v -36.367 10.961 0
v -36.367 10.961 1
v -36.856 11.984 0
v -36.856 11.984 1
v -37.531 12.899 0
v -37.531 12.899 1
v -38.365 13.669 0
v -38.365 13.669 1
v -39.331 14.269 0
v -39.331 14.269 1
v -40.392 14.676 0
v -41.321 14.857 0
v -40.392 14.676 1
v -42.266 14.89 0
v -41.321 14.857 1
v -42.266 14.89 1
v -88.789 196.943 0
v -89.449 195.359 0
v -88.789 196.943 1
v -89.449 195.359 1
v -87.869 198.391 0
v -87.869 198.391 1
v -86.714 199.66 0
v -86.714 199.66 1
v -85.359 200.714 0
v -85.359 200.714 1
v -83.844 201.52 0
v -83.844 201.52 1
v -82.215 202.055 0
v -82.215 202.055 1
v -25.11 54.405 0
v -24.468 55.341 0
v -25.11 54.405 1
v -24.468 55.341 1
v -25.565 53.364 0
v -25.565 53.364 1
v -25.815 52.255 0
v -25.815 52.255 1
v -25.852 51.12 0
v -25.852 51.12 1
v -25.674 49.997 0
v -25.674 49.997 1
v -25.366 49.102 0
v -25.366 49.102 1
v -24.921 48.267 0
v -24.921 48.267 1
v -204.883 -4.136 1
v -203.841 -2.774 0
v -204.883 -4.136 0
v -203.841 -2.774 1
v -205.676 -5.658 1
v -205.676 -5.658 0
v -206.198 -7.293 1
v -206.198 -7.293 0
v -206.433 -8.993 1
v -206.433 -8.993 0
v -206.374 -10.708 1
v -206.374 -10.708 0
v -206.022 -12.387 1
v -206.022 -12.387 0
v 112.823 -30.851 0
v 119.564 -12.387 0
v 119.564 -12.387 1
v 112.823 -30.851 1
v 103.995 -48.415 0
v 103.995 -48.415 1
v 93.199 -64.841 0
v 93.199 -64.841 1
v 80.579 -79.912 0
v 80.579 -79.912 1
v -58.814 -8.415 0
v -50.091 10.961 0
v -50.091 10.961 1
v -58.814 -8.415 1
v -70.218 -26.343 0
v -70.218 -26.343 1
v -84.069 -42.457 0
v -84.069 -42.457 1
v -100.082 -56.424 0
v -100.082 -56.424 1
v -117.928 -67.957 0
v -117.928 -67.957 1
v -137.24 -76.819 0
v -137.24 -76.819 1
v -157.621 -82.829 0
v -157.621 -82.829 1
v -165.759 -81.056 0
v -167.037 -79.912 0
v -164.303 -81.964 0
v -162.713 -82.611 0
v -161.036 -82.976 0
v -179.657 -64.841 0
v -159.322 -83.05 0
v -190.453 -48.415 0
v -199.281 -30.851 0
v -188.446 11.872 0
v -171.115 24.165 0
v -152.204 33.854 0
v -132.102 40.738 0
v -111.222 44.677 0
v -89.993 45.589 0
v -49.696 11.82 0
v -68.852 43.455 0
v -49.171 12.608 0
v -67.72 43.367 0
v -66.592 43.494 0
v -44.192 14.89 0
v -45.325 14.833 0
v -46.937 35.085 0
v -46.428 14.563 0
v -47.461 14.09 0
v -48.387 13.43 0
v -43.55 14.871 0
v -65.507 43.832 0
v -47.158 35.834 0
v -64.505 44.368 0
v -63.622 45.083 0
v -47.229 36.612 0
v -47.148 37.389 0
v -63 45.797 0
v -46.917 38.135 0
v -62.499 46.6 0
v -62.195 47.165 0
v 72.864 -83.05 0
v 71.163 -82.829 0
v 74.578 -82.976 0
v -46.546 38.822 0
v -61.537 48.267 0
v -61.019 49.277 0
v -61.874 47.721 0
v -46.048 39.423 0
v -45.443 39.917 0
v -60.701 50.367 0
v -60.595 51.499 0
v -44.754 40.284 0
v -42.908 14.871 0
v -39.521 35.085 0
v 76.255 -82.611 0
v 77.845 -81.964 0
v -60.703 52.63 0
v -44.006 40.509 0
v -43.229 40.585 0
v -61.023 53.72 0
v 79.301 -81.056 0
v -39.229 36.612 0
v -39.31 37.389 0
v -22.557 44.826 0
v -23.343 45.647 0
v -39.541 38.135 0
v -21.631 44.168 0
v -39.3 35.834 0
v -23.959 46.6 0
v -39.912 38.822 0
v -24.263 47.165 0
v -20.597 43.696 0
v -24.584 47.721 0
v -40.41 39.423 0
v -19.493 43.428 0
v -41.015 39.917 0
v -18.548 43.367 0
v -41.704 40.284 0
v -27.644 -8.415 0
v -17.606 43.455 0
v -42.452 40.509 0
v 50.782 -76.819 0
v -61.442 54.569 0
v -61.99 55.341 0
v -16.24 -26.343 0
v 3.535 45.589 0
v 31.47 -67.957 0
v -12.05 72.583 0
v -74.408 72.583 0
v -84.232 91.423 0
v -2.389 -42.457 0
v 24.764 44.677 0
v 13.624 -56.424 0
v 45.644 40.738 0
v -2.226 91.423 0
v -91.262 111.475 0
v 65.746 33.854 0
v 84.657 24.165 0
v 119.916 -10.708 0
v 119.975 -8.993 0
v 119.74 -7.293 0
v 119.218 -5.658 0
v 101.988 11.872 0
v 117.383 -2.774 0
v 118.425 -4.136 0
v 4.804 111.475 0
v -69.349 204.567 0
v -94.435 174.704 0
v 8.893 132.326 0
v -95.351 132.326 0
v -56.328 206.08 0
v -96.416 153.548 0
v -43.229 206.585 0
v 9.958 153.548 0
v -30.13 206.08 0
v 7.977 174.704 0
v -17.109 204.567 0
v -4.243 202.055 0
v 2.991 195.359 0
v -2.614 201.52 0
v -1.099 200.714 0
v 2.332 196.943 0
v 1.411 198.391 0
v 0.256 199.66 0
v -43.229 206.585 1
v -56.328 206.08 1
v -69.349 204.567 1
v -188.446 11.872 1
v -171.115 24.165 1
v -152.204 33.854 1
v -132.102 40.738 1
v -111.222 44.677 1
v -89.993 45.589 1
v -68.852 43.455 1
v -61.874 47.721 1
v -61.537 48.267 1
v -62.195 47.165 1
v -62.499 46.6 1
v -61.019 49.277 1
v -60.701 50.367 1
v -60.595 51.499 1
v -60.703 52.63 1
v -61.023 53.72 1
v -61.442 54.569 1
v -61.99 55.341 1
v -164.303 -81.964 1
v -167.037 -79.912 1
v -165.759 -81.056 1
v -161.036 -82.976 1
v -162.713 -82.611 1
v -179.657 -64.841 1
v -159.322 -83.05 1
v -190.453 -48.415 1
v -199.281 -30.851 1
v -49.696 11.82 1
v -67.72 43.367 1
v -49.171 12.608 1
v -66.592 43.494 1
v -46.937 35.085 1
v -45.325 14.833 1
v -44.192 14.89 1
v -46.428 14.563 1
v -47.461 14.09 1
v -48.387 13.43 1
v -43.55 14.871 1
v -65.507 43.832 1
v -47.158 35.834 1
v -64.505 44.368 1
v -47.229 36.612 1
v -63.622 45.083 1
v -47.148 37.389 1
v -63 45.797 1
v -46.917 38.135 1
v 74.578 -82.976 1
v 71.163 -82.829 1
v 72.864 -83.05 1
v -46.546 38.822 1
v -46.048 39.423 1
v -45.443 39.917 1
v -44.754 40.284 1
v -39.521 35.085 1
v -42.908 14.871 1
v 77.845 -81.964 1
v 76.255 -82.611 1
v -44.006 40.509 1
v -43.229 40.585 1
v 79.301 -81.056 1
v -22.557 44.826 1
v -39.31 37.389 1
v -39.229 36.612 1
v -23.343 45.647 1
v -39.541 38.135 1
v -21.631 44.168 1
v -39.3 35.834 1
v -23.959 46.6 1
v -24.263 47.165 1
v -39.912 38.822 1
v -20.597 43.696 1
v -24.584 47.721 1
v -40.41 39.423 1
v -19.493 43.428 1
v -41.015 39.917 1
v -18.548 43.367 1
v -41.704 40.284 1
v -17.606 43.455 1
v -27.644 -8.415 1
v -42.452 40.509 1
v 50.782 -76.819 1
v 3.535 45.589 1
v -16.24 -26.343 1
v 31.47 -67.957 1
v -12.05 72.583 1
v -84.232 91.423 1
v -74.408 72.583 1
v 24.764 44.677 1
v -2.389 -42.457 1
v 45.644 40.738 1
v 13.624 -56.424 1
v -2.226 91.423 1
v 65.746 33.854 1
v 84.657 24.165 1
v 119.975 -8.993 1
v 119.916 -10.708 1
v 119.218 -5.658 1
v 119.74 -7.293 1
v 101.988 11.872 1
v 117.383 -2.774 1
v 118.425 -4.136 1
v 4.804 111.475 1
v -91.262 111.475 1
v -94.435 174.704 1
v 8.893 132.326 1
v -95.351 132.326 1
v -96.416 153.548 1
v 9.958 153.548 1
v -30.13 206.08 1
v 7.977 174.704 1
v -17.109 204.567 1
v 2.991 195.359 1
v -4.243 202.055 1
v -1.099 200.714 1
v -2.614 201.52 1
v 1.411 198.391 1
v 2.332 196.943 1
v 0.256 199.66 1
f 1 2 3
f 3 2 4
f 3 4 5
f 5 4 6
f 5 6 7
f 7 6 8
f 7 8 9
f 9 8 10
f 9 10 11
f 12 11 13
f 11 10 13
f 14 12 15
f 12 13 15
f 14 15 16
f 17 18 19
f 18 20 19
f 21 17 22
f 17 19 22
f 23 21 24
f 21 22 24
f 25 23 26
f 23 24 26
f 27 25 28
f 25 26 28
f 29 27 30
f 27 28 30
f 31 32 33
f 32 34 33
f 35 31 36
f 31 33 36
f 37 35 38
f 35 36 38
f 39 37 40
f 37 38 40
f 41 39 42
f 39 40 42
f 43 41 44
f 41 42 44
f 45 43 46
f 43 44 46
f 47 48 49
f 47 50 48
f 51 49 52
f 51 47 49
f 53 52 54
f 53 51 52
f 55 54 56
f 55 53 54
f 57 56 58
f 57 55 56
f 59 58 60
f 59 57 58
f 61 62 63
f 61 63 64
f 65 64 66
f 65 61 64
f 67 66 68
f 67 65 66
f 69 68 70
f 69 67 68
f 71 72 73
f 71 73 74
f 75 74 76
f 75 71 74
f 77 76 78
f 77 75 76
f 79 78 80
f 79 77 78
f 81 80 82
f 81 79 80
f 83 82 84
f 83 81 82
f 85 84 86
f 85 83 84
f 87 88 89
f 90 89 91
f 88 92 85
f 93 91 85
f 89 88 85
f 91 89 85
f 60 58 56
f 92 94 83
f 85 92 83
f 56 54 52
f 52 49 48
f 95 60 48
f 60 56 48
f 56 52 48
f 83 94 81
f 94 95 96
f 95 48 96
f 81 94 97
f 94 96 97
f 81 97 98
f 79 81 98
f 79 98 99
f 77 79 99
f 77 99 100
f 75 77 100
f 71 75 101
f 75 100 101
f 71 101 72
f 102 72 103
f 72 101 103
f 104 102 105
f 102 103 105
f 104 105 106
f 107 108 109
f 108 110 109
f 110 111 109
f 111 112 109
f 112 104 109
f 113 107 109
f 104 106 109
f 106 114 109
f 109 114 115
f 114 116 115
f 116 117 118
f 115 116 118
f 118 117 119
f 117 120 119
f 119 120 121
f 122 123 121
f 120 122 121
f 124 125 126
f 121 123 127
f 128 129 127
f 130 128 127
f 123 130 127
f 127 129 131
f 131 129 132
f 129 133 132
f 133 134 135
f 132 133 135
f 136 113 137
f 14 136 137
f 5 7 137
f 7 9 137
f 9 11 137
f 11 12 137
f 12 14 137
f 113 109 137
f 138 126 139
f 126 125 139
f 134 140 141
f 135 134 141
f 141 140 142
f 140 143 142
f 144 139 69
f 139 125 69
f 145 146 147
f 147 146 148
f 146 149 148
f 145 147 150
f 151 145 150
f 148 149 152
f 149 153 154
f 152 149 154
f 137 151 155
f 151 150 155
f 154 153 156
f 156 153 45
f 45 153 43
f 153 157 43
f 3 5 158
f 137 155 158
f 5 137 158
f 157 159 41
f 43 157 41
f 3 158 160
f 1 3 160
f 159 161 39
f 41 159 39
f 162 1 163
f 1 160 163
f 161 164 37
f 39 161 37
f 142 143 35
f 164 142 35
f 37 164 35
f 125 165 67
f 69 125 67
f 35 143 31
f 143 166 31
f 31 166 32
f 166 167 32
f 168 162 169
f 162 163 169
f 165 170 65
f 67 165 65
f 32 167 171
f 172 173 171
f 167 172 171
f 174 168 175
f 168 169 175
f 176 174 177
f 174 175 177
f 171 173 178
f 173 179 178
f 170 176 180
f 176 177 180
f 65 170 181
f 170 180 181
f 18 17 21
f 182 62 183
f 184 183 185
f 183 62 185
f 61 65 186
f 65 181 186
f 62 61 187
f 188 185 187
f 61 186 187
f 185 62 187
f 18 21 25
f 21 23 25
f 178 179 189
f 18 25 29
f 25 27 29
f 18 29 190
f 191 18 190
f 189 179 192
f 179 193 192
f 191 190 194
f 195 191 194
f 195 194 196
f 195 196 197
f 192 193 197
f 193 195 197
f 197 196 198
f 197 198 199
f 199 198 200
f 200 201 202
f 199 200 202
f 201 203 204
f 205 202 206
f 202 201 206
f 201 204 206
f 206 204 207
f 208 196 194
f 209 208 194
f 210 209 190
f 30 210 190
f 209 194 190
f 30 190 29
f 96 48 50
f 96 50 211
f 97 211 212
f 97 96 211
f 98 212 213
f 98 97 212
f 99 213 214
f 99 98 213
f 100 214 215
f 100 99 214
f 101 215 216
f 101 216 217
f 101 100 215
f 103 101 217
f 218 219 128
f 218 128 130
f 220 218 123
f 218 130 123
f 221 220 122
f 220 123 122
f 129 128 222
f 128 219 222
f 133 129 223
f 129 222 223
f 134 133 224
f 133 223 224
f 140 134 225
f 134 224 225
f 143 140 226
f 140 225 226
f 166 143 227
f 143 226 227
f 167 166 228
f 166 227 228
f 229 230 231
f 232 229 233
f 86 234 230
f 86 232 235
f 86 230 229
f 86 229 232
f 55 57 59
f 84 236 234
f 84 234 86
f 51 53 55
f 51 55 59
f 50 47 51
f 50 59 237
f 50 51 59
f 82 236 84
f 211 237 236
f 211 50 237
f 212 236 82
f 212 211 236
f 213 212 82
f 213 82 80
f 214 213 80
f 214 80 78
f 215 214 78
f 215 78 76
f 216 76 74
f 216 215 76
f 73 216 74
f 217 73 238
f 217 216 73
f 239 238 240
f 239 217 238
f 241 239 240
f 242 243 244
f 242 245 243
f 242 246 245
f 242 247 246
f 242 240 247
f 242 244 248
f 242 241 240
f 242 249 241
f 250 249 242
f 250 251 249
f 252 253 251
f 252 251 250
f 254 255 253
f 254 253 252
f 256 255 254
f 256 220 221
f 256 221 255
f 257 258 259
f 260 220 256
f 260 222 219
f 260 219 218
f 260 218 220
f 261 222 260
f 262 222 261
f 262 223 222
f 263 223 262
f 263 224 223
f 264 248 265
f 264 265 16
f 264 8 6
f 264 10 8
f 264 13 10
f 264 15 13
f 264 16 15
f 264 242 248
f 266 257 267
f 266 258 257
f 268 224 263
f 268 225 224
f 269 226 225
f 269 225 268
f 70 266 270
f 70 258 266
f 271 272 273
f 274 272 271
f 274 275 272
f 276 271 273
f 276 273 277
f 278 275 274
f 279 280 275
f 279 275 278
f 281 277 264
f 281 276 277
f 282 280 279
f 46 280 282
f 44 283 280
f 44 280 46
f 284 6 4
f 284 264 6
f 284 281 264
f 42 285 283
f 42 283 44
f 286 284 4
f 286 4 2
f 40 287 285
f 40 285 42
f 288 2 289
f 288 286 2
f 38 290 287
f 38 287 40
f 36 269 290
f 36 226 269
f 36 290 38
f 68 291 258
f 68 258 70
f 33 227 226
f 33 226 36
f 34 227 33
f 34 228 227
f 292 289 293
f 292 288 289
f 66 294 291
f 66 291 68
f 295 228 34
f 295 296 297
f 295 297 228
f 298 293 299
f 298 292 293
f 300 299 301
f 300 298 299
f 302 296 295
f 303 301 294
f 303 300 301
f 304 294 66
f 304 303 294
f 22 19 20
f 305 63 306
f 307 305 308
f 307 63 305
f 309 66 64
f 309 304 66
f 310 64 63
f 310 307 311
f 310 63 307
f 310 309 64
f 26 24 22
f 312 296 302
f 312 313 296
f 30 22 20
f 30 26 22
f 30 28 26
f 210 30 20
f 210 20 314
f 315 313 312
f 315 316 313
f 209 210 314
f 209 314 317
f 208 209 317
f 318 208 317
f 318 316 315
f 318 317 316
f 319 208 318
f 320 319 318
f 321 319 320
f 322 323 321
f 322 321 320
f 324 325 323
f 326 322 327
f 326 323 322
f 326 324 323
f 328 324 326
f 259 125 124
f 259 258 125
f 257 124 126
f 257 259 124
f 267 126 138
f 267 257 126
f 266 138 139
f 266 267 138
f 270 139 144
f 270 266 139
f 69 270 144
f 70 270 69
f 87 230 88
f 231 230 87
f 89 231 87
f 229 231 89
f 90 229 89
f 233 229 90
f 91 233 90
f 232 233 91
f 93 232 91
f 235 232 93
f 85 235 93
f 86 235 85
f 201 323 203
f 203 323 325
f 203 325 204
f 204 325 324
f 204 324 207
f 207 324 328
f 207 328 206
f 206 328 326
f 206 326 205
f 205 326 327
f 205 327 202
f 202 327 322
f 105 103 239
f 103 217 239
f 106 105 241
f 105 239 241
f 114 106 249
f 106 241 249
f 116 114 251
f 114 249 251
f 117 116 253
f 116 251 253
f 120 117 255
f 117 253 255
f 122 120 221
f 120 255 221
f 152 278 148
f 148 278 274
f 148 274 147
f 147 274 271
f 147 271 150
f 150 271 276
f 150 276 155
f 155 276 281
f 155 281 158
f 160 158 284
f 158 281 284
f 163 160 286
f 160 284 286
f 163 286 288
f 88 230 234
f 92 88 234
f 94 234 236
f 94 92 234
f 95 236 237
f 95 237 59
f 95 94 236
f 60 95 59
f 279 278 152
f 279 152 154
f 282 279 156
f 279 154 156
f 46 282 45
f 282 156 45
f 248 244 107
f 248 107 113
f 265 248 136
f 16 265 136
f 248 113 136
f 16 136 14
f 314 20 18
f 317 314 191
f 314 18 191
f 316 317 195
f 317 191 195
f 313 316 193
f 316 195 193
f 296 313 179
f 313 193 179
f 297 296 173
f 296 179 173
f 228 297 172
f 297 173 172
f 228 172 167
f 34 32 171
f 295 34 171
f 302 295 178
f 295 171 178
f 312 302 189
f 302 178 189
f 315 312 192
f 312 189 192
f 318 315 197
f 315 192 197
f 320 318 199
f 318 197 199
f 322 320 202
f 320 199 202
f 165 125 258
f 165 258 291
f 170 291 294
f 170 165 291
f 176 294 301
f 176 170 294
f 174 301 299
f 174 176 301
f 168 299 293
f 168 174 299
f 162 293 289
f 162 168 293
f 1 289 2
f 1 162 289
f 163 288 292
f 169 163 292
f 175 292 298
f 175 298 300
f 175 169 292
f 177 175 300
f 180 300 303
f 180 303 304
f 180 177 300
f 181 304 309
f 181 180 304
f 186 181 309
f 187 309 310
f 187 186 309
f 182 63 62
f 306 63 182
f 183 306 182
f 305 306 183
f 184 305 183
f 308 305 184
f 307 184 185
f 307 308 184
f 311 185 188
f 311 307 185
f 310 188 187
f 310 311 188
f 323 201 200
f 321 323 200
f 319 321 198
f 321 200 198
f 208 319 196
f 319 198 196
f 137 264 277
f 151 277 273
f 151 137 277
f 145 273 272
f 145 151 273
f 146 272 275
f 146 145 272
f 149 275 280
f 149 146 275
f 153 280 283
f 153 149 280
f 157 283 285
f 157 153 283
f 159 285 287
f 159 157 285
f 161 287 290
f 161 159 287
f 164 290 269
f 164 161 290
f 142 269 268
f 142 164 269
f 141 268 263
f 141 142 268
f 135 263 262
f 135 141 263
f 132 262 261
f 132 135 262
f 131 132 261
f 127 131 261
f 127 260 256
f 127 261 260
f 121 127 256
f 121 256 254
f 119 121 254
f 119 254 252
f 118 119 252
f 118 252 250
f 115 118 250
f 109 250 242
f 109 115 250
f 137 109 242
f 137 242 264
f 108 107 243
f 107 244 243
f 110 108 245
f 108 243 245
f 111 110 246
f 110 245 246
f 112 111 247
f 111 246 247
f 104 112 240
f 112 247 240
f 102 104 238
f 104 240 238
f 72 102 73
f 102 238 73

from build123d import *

# Parameters (mm, degrees)
ESQUISSE2_R             = 21.716757685
BOSS_EXTRU_1_DEPTH      = 1
ENL_V_MAT_EXTRU_2_DEPTH = 293.837814183
CONG_2_R                = 10
CONG_3_R                = 6
CONG_4_R                = 6
CONG_5_R                = 6


with BuildPart() as part:
    # Esquisse2 → Boss.-Extru.1 (new body)
    with BuildSketch(Plane.XY):
        with Locations((-43.22899501, 36.585487108)):
            Circle(ESQUISSE2_R)
        with BuildLine():
            ThreePointArc((-207.546192285, -7.001881243), (-132.259115873, 40.696309579), (-43.22899501, 36.585487108))
            ThreePointArc((-43.22899501, 36.585487108), (-84.183978752, -42.572270496), (-163.135361924, -83.923695834))
            ThreePointArc((-163.135361924, -83.923695834), (-190.453313653, -48.414512892), (-207.546192285, -7.001881243))
        make_face()
        with BuildLine():
            ThreePointArc((76.677371904, -83.923695834), (-2.274011269, -42.572270496), (-43.22899501, 36.585487108))
            ThreePointArc((-43.22899501, 36.585487108), (45.801125853, 40.696309579), (121.088202265, -7.001881243))
            ThreePointArc((121.088202265, -7.001881243), (103.995323633, -48.414512892), (76.677371904, -83.923695834))
        make_face()
        with BuildLine():
            Line((-43.22899501, 206.585487108), (-43.22899501, 58.302244794))
            ThreePointArc((-43.22899501, 58.302244794), (-34.753748483, 56.580180421), (-27.622617897, 51.687094896))
            ThreePointArc((-27.622617897, 51.687094896), (7.298277527, 122.217794206), (1.181835351, 200.682038403))
            ThreePointArc((1.181835351, 200.682038403), (-20.82825529, 205.103162324), (-43.22899501, 206.585487108))
        make_face()
        with BuildLine():
            ThreePointArc((-58.835372123, 51.687094896), (-51.704241537, 56.580180421), (-43.22899501, 58.302244794))
            Line((-43.22899501, 58.302244794), (-43.22899501, 206.585487108))
            ThreePointArc((-43.22899501, 206.585487108), (-65.62973473, 205.103162324), (-87.639825371, 200.682038403))
            ThreePointArc((-87.639825371, 200.682038403), (-93.756267547, 122.217794206), (-58.835372123, 51.687094896))
        make_face()
        with BuildLine():
            ThreePointArc((-48.504182436, 15.519164174), (-45.480177087, 25.955564863), (-43.22899501, 36.585487108))
            ThreePointArc((-43.22899501, 36.585487108), (-53.560368754, 39.950867364), (-64.110559549, 42.550202255))
            ThreePointArc((-64.110559549, 42.550202255), (-62.036258854, 25.727108266), (-48.504182436, 15.519164174))
        make_face()
        with BuildLine():
            ThreePointArc((-22.347430471, 42.550202255), (-32.897621267, 39.950867364), (-43.22899501, 36.585487108))
            ThreePointArc((-43.22899501, 36.585487108), (-40.977812933, 25.955564863), (-37.953807584, 15.519164174))
            ThreePointArc((-37.953807584, 15.519164174), (-26.109159563, 23.224020174), (-21.512237325, 36.585487108))
            ThreePointArc((-21.512237325, 36.585487108), (-21.722049137, 39.596939182), (-22.347430471, 42.550202255))
        make_face()
        with BuildLine():
            ThreePointArc((-37.953807584, 15.519164174), (-40.977812933, 25.955564863), (-43.22899501, 36.585487108))
            ThreePointArc((-43.22899501, 36.585487108), (-45.480177087, 25.955564863), (-48.504182436, 15.519164174))
            ThreePointArc((-48.504182436, 15.519164174), (-43.22899501, 14.868729423), (-37.953807584, 15.519164174))
        make_face()
        with BuildLine():
            ThreePointArc((-64.110559549, 42.550202255), (-53.560368754, 39.950867364), (-43.22899501, 36.585487108))
            ThreePointArc((-43.22899501, 36.585487108), (-51.309186676, 43.850029099), (-58.835372123, 51.687094896))
            ThreePointArc((-58.835372123, 51.687094896), (-62.036258854, 47.443865951), (-64.110559549, 42.550202255))
        make_face()
        with BuildLine():
            ThreePointArc((-58.835372123, 51.687094896), (-51.309186676, 43.850029099), (-43.22899501, 36.585487108))
            Line((-43.22899501, 36.585487108), (-43.22899501, 58.302244794))
            ThreePointArc((-43.22899501, 58.302244794), (-51.704241537, 56.580180421), (-58.835372123, 51.687094896))
        make_face()
        with BuildLine():
            Line((-43.22899501, 58.302244794), (-43.22899501, 36.585487108))
            ThreePointArc((-43.22899501, 36.585487108), (-35.148803344, 43.850029099), (-27.622617897, 51.687094896))
            ThreePointArc((-27.622617897, 51.687094896), (-34.753748483, 56.580180421), (-43.22899501, 58.302244794))
        make_face()
        with BuildLine():
            ThreePointArc((-27.622617897, 51.687094896), (-35.148803344, 43.850029099), (-43.22899501, 36.585487108))
            ThreePointArc((-43.22899501, 36.585487108), (-32.897621267, 39.950867364), (-22.347430471, 42.550202255))
            ThreePointArc((-22.347430471, 42.550202255), (-24.421731167, 47.443865951), (-27.622617897, 51.687094896))
        make_face()
    extrude(amount=BOSS_EXTRU_1_DEPTH)

    # Esquisse4 → Enlèv. mat.-Extru.2 (cut, through all)
    with BuildSketch(Plane(origin=(0, 0, 0), x_dir=(-1, 0, 0), z_dir=(0, 0, -1))):
        with BuildLine():
            Line((46.937094254, 35.085487108), (39.520895767, 35.085487108))
            ThreePointArc((39.520895767, 35.085487108), (43.22899501, 40.585487108), (46.937094254, 35.085487108))
        make_face()
    extrude(amount=-ENL_V_MAT_EXTRU_2_DEPTH, mode=Mode.SUBTRACT)

    # Congé2
    cong_2_edges = [part.edges().sort_by_distance(p)[0] for p in [
        (-87.639825371, 200.682038403, 0.5),
        (1.181835351, 200.682038403, 0.5),
        (121.088202265, -7.001881243, 0.5),
        (76.677371904, -83.923695834, 0.5),
        (-163.135361924, -83.923695834, 0.5),
        (-207.546192285, -7.001881243, 0.5),
    ]]
    fillet(cong_2_edges, radius=CONG_2_R)

    # Congé3
    cong_3_edges = [part.edges().sort_by_distance(p)[0] for p in [
        (-64.110559549, 42.550202255, 0.5),
        (-58.835372123, 51.687094896, 0.5),
    ]]
    fillet(cong_3_edges, radius=CONG_3_R)

    # Congé4
    cong_4_edges = [part.edges().sort_by_distance(p)[0] for p in [
        (-27.622617897, 51.687094896, 0.5),
        (-22.347430471, 42.550202255, 0.5),
    ]]
    fillet(cong_4_edges, radius=CONG_4_R)

    # Congé5
    cong_5_edges = [part.edges().sort_by_distance(p)[0] for p in [
        (-37.953807584, 15.519164174, 0.5),
        (-48.504182436, 15.519164174, 0.5),
    ]]
    fillet(cong_5_edges, radius=CONG_5_R)


solid = part.part
